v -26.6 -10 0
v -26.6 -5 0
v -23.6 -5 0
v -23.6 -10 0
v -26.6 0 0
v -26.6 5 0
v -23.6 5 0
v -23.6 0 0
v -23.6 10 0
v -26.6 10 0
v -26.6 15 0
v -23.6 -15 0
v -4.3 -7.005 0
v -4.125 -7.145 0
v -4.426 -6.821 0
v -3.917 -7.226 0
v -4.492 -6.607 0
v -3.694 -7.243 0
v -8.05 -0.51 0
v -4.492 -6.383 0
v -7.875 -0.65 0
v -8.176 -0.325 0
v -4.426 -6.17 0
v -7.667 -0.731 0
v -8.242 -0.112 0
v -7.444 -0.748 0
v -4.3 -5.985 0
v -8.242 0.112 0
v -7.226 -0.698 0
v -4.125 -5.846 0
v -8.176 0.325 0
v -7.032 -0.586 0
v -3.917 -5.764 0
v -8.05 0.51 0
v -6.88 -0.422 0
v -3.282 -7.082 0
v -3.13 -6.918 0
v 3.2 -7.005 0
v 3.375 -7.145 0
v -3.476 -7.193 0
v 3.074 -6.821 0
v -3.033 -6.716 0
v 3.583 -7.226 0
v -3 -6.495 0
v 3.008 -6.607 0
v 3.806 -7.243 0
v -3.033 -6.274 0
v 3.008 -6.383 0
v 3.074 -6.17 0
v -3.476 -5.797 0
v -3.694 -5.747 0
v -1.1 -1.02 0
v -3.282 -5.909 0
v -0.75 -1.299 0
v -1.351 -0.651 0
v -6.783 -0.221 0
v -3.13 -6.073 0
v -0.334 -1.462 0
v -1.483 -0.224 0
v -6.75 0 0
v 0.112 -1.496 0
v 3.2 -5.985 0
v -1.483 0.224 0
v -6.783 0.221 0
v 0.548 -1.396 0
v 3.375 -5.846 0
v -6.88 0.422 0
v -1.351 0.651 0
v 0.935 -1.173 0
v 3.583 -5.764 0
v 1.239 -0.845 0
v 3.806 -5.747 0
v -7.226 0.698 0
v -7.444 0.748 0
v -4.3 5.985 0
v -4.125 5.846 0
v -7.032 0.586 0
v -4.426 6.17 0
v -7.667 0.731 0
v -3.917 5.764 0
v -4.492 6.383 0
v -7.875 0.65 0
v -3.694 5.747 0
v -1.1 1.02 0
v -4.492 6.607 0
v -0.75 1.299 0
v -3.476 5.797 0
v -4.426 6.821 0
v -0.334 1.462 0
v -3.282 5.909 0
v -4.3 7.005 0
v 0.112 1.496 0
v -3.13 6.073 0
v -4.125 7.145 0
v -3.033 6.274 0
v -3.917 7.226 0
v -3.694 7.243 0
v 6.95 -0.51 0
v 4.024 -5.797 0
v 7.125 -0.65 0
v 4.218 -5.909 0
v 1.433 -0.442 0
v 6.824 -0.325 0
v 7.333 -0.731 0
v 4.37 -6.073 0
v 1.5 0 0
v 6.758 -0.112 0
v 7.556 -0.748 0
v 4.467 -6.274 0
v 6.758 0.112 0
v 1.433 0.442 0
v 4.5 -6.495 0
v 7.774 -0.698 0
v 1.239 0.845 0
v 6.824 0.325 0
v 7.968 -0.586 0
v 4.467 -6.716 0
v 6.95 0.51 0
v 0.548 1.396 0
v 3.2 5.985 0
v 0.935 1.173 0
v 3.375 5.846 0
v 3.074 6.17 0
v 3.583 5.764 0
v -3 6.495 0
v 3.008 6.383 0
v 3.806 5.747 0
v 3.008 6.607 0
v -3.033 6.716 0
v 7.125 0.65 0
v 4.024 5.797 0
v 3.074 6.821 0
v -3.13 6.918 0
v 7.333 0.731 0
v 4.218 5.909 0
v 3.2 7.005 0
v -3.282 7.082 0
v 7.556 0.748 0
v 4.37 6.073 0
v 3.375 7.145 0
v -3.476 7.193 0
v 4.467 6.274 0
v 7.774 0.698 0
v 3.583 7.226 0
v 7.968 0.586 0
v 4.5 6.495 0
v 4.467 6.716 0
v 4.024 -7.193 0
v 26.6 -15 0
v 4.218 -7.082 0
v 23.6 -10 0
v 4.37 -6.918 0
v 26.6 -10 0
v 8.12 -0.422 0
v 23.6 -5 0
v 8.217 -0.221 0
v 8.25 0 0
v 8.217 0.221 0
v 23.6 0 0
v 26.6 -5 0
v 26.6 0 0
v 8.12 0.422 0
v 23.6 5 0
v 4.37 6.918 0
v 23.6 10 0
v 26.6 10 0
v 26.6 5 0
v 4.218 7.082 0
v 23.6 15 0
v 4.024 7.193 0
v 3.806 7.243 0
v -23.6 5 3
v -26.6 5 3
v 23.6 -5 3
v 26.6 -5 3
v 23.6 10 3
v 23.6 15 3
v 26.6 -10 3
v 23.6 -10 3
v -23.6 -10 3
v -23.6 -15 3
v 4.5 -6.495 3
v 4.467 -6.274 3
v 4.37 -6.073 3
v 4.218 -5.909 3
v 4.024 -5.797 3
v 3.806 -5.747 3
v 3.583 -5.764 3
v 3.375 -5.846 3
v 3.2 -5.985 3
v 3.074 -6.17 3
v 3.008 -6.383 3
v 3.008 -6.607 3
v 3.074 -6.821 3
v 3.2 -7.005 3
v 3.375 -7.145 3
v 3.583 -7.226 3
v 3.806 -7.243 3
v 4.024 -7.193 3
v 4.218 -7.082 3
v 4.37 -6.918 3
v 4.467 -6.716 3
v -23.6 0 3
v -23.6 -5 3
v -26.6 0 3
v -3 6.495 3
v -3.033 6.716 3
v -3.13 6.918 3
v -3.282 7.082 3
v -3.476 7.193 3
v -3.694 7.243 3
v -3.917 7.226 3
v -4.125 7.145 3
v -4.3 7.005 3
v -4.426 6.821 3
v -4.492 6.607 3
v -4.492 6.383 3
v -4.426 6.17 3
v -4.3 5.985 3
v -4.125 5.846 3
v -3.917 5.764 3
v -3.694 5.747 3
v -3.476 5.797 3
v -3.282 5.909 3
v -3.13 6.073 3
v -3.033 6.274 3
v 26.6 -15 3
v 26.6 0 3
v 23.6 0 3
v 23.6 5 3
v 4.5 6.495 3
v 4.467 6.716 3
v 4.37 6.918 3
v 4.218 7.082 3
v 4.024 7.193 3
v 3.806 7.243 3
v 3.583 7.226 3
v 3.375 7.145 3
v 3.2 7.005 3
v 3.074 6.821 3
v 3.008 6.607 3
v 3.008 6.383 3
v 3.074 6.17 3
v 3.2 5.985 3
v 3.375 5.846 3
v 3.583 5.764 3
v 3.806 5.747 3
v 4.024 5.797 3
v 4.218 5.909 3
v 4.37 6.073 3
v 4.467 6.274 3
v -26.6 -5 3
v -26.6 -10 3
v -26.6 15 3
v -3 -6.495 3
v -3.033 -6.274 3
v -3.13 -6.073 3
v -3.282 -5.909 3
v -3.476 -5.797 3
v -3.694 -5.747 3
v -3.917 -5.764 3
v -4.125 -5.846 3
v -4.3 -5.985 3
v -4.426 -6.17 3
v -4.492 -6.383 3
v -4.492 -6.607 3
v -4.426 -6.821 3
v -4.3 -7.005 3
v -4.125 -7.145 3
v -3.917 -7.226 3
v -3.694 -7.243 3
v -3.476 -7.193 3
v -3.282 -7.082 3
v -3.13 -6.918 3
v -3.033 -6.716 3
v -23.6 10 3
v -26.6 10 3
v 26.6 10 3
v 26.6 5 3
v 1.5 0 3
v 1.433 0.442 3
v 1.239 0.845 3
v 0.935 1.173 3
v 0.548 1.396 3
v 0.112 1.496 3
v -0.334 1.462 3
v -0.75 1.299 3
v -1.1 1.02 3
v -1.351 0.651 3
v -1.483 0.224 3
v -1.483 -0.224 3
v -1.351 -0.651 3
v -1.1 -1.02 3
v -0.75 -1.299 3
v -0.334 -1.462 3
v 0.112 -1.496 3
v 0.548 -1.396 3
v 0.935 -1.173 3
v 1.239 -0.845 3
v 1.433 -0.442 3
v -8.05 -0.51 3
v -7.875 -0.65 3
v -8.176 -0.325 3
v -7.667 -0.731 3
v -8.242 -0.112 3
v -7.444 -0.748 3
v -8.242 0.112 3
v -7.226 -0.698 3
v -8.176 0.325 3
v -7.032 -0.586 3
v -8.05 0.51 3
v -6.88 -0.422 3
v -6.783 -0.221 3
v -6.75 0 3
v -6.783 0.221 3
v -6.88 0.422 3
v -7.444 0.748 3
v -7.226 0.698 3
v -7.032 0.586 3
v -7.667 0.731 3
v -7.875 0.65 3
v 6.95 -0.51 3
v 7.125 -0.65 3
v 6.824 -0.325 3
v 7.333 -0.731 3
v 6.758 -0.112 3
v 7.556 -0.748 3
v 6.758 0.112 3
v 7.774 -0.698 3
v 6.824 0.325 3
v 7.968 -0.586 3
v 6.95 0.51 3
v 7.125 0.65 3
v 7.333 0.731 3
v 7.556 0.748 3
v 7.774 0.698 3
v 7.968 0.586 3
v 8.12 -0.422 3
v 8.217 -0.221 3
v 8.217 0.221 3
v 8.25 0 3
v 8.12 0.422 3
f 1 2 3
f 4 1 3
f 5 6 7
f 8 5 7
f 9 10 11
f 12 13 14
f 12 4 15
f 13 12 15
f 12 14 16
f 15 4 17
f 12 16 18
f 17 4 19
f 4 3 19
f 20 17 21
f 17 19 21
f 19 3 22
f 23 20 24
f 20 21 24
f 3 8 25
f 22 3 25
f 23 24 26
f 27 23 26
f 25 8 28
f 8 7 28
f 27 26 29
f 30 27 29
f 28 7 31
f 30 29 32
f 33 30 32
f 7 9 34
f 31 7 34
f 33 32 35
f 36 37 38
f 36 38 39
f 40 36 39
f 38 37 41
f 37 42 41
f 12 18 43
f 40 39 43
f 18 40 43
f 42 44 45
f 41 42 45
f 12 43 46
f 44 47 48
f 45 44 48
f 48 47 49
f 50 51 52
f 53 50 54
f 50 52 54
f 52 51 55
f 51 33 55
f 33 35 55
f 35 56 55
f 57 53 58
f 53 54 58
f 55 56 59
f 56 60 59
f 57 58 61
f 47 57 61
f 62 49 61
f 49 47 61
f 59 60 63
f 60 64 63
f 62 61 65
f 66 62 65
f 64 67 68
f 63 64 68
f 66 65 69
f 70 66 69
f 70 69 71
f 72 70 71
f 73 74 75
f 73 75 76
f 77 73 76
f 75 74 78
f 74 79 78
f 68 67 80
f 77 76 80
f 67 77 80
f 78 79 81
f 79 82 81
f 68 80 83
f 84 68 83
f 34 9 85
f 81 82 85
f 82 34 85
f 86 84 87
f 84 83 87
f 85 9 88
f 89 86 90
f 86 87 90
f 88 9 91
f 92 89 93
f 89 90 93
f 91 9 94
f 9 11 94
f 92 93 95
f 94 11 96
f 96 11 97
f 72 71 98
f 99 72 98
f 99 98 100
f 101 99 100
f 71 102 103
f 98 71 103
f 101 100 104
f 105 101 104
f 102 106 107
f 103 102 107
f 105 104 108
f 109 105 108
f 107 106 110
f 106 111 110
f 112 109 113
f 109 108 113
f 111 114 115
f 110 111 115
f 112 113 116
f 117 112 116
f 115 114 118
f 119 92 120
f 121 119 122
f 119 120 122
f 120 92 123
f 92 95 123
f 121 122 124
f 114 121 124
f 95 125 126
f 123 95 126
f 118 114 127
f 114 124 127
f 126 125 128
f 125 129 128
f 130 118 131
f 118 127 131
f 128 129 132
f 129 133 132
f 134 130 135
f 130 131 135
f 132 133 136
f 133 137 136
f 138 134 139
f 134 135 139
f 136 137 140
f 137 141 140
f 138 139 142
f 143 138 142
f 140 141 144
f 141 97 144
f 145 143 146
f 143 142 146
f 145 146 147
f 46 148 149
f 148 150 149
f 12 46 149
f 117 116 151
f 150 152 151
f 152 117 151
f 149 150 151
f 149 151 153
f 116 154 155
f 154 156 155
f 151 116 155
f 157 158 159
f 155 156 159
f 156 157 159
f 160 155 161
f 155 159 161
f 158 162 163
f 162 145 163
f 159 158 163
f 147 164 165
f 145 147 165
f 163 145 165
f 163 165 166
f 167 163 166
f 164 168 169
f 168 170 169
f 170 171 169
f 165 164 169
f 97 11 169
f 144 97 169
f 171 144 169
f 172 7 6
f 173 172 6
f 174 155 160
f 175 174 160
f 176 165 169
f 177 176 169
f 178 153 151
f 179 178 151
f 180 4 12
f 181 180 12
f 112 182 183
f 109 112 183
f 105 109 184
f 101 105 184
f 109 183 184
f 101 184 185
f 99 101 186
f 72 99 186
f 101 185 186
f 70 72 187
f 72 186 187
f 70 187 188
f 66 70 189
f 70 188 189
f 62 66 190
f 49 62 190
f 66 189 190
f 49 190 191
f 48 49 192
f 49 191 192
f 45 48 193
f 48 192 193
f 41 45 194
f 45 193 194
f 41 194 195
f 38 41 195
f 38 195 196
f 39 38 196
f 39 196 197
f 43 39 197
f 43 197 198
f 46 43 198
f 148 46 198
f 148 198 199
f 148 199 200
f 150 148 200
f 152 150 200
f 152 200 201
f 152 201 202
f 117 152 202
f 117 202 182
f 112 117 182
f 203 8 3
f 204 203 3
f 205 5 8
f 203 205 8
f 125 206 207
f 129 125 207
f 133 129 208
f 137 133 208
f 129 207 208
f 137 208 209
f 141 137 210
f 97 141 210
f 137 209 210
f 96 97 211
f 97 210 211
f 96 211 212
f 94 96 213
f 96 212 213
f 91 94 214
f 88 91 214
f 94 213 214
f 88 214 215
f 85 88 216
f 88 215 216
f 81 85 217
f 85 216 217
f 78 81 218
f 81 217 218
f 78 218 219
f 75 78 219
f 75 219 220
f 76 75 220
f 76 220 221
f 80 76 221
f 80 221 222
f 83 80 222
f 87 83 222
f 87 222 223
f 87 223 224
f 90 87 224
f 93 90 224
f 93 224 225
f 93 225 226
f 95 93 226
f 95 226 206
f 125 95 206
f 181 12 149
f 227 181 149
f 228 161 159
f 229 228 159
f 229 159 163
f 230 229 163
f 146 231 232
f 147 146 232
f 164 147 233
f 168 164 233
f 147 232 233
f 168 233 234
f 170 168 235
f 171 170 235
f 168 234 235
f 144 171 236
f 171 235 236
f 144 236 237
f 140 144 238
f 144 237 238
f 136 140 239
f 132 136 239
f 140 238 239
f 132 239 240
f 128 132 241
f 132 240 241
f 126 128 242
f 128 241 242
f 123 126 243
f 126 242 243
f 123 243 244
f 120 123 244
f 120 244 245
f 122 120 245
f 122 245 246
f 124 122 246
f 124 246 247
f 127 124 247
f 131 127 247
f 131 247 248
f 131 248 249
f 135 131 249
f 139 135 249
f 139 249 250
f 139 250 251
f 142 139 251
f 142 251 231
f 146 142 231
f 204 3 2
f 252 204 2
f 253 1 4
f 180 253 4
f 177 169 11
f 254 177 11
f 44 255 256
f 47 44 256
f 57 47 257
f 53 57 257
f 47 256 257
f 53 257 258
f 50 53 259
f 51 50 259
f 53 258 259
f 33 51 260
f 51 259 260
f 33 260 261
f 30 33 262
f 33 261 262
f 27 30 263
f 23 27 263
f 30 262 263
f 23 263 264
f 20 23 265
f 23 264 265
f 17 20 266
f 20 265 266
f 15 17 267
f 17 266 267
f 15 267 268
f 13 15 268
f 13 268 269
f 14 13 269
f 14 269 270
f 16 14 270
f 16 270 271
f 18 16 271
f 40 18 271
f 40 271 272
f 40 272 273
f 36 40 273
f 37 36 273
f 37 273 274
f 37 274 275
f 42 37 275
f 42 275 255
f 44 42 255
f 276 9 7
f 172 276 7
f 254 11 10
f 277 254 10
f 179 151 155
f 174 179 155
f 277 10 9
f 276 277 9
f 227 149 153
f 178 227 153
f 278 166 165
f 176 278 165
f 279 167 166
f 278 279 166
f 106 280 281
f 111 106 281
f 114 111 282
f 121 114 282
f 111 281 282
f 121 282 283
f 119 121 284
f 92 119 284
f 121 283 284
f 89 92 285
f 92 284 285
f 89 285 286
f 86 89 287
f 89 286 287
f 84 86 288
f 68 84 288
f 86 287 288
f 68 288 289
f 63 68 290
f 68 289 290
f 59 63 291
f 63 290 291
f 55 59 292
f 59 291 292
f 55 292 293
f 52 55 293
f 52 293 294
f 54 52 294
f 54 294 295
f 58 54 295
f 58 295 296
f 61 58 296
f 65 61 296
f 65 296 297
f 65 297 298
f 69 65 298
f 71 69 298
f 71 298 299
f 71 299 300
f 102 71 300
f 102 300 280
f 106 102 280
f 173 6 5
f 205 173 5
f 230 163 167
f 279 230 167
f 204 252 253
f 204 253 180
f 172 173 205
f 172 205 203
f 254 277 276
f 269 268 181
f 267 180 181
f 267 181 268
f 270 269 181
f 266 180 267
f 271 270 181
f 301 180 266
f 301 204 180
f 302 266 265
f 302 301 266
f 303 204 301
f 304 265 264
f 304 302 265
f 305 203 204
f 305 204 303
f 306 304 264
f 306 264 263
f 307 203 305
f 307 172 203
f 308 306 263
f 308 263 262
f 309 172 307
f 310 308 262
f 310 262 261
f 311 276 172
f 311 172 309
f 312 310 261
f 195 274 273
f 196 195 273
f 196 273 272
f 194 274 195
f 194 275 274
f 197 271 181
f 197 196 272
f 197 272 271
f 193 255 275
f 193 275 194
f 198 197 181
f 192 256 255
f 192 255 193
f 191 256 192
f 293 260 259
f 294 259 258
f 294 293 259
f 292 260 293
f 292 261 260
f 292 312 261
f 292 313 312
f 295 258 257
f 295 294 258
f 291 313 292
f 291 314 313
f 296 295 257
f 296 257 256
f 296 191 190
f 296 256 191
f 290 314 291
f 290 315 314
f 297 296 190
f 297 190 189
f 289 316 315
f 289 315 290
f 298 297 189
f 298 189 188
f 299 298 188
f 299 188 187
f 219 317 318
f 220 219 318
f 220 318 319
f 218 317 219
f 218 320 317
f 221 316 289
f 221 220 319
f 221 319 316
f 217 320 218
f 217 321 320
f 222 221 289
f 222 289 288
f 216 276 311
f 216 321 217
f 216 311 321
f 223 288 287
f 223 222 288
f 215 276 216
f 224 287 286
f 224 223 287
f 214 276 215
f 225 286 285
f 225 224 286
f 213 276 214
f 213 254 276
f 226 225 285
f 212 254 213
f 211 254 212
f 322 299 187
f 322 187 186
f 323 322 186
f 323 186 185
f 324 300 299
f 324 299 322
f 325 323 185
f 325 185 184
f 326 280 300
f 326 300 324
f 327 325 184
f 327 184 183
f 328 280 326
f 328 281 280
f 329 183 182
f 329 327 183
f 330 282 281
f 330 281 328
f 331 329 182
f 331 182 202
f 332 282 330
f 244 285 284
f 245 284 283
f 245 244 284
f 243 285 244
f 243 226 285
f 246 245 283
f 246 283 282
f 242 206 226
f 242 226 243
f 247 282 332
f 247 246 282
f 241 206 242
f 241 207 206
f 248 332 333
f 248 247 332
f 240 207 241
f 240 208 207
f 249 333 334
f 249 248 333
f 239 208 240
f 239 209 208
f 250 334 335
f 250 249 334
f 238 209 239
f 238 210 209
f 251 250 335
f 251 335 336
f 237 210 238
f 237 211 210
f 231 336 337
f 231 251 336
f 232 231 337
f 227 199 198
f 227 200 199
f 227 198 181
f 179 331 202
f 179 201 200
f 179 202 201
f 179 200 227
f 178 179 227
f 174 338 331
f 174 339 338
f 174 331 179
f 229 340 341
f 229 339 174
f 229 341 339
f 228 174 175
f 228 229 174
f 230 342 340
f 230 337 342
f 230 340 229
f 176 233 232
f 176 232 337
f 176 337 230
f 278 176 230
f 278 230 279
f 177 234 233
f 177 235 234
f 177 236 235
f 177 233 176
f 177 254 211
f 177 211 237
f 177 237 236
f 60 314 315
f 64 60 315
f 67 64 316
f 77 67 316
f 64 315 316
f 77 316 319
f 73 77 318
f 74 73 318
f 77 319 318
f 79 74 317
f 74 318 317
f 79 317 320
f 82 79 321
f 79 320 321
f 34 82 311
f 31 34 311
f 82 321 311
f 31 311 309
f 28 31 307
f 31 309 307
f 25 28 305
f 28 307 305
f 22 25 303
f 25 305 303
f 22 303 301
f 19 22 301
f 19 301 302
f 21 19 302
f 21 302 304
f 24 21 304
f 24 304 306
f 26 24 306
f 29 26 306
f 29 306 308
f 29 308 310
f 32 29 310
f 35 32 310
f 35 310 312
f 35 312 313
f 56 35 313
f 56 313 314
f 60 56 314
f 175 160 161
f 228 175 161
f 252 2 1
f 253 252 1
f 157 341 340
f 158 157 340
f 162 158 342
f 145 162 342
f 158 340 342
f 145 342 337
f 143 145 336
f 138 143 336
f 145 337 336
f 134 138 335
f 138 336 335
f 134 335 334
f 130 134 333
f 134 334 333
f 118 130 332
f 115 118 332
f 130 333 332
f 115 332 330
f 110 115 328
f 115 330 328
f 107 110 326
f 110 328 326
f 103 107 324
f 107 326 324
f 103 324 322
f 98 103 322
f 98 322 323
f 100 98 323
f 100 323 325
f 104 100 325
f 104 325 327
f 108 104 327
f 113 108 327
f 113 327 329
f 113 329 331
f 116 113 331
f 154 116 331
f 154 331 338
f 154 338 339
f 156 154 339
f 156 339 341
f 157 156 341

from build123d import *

# Parameters (mm, degrees)
SALIENTE_EXTRUIR1_DEPTH = 3
CORTAR_EXTRUIR1_REACH   = 32.685
CROQUIS2_R              = 1.5
CROQUIS2_R_2            = 0.75


with BuildPart() as part:
    # Croquis1 → Saliente-Extruir1 (new body)
    with BuildSketch(Plane.XY):
        Polygon((26.6, 5), (26.6, 10), (23.6, 10), (23.6, 15), (-26.6, 15), (-26.6, 10), (-23.6, 10), (-23.6, 5), (-26.6, 5), (-26.6, 0), (-23.6, 0), (-23.6, -5), (-26.6, -5), (-26.6, -10), (-23.6, -10), (-23.6, -15), (26.6, -15), (26.6, -10), (23.6, -10), (23.6, -5), (26.6, -5), (26.6, 0), (23.6, 0), (23.6, 5), align=None)
    extrude(amount=SALIENTE_EXTRUIR1_DEPTH)

    # Croquis2 → Cortar-Extruir1 (cut, up to next)
    with BuildSketch(Plane.XY.offset(3), mode=Mode.PRIVATE) as cortar_extruir1_sk1:
        Circle(CROQUIS2_R)
    cortar_extruir1_tool1 = extrude(cortar_extruir1_sk1.sketch, amount=-CORTAR_EXTRUIR1_REACH, mode=Mode.PRIVATE) & part.part
    # Croquis2 → Cortar-Extruir1 (cut, up to next)
    with BuildSketch(Plane.XY.offset(3), mode=Mode.PRIVATE) as cortar_extruir1_sk2:
        with Locations((7.5, 0)):
            Circle(CROQUIS2_R_2)
    cortar_extruir1_tool2 = extrude(cortar_extruir1_sk2.sketch, amount=-CORTAR_EXTRUIR1_REACH, mode=Mode.PRIVATE) & part.part
    # Croquis2 → Cortar-Extruir1 (cut, up to next)
    with BuildSketch(Plane.XY.offset(3), mode=Mode.PRIVATE) as cortar_extruir1_sk3:
        with Locations((3.75, -6.495190528)):
            Circle(CROQUIS2_R_2)
    cortar_extruir1_tool3 = extrude(cortar_extruir1_sk3.sketch, amount=-CORTAR_EXTRUIR1_REACH, mode=Mode.PRIVATE) & part.part
    # Croquis2 → Cortar-Extruir1 (cut, up to next)
    with BuildSketch(Plane.XY.offset(3), mode=Mode.PRIVATE) as cortar_extruir1_sk4:
        with Locations((-3.75, -6.495190528)):
            Circle(CROQUIS2_R_2)
    cortar_extruir1_tool4 = extrude(cortar_extruir1_sk4.sketch, amount=-CORTAR_EXTRUIR1_REACH, mode=Mode.PRIVATE) & part.part
    # Croquis2 → Cortar-Extruir1 (cut, up to next)
    with BuildSketch(Plane.XY.offset(3), mode=Mode.PRIVATE) as cortar_extruir1_sk5:
        with Locations((-7.5, 0)):
            Circle(CROQUIS2_R_2)
    cortar_extruir1_tool5 = extrude(cortar_extruir1_sk5.sketch, amount=-CORTAR_EXTRUIR1_REACH, mode=Mode.PRIVATE) & part.part
    # Croquis2 → Cortar-Extruir1 (cut, up to next)
    with BuildSketch(Plane.XY.offset(3), mode=Mode.PRIVATE) as cortar_extruir1_sk6:
        with Locations((-3.75, 6.495190528)):
            Circle(CROQUIS2_R_2)
    cortar_extruir1_tool6 = extrude(cortar_extruir1_sk6.sketch, amount=-CORTAR_EXTRUIR1_REACH, mode=Mode.PRIVATE) & part.part
    # Croquis2 → Cortar-Extruir1 (cut, up to next)
    with BuildSketch(Plane.XY.offset(3), mode=Mode.PRIVATE) as cortar_extruir1_sk7:
        with Locations((3.75, 6.495190528)):
            Circle(CROQUIS2_R_2)
    cortar_extruir1_tool7 = extrude(cortar_extruir1_sk7.sketch, amount=-CORTAR_EXTRUIR1_REACH, mode=Mode.PRIVATE) & part.part
    add(cortar_extruir1_tool1.solids().sort_by_distance((0, 0, 3))[0], mode=Mode.SUBTRACT)
    add(cortar_extruir1_tool2.solids().sort_by_distance((7.5, 0, 3))[0], mode=Mode.SUBTRACT)
    add(cortar_extruir1_tool3.solids().sort_by_distance((3.75, -6.495191, 3))[0], mode=Mode.SUBTRACT)
    add(cortar_extruir1_tool4.solids().sort_by_distance((-3.75, -6.495191, 3))[0], mode=Mode.SUBTRACT)
    add(cortar_extruir1_tool5.solids().sort_by_distance((-7.5, 0, 3))[0], mode=Mode.SUBTRACT)
    add(cortar_extruir1_tool6.solids().sort_by_distance((-3.75, 6.495191, 3))[0], mode=Mode.SUBTRACT)
    add(cortar_extruir1_tool7.solids().sort_by_distance((3.75, 6.495191, 3))[0], mode=Mode.SUBTRACT)


solid = part.part
